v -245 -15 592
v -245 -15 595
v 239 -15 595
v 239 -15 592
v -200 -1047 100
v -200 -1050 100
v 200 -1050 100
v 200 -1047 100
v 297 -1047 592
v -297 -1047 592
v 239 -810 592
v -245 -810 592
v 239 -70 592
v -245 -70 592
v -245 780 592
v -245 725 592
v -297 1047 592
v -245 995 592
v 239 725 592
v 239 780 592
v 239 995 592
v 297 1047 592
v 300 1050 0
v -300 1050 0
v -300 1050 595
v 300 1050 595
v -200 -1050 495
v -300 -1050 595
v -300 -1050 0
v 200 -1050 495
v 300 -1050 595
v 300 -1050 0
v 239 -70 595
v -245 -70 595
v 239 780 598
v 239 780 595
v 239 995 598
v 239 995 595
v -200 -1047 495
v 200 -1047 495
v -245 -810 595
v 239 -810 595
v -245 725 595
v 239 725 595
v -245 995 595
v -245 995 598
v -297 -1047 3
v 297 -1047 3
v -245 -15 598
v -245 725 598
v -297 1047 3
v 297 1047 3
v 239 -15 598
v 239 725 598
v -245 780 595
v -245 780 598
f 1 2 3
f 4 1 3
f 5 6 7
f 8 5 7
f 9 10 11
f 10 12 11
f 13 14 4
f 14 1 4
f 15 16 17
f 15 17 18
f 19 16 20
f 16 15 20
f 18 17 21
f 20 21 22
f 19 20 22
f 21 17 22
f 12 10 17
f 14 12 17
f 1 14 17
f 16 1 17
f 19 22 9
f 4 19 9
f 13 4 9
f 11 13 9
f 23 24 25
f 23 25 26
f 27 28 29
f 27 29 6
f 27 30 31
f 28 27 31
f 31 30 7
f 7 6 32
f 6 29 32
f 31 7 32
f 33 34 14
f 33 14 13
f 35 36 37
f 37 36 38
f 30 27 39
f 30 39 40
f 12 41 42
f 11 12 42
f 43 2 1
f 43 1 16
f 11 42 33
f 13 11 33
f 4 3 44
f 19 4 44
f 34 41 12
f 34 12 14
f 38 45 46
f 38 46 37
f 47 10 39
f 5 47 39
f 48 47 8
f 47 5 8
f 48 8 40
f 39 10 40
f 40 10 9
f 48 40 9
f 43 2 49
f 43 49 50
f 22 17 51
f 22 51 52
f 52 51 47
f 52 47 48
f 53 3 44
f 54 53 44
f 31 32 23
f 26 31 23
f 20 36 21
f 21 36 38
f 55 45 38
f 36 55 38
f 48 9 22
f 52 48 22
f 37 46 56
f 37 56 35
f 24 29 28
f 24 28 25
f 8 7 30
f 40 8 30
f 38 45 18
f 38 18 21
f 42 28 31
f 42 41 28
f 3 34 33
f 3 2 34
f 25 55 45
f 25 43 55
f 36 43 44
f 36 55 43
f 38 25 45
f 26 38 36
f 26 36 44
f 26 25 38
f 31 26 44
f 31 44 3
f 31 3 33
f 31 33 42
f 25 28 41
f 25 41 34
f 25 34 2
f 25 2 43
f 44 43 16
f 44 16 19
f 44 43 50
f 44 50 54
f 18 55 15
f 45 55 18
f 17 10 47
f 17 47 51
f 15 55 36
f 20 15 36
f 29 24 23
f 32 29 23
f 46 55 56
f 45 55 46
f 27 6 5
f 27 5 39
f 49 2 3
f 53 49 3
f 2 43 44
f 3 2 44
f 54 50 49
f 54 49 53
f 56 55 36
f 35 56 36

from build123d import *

# Parameters (mm, degrees)
CROQUIS1_W                = 600
CROQUIS1_H                = 2100
SALIENTE_EXTRUIR1_DEPTH   = 595
CROQUIS2_W                = 594
CROQUIS2_H                = 2094
CORTAR_EXTRUIR1_DEPTH     = 592
CROQUIS3_W                = 594
CROQUIS3_H                = 237
SALIENTE_EXTRUIR2_DEPTH   = 3
CROQUIS4_W                = 400
CROQUIS4_H                = 395
CORTAR_EXTRUIR2_DEPTH     = 3
CROQUIS5_W                = 52
CROQUIS5_H                = 740
SALIENTE_EXTRUIR3_DEPTH   = 3
CROQUIS5_W_2              = 58
SALIENTE_EXTRUIR3_2_DEPTH = 3
CROQUIS6_W                = 484
CROQUIS6_H                = 740
SALIENTE_EXTRUIR4_DEPTH   = 3
CROQUIS7_W                = 594
CROQUIS7_H                = 55
SALIENTE_EXTRUIR5_DEPTH   = 3
CROQUIS8_W                = 52
CROQUIS8_H                = 740
CROQUIS8_W_2              = 58
SALIENTE_EXTRUIR6_DEPTH   = 3
CROQUIS9_W                = 484
CROQUIS9_H                = 740
SALIENTE_EXTRUIR7_DEPTH   = 3
CROQUIS10_W               = 594
CROQUIS10_H               = 322
CROQUIS10_W_2             = 484
CROQUIS10_H_2             = 215
SALIENTE_EXTRUIR8_DEPTH   = 3
CROQUIS11_W               = 484
CROQUIS11_H               = 215
SALIENTE_EXTRUIR9_DEPTH   = 3
CROQUIS12_W               = 484
CROQUIS12_H               = 740
CORTAR_EXTRUIR3_DEPTH     = 4


with BuildPart() as part:
    # Croquis1 → Saliente-Extruir1 (new body)
    with BuildSketch(Plane.XY):
        Rectangle(CROQUIS1_W, CROQUIS1_H)
    extrude(amount=SALIENTE_EXTRUIR1_DEPTH)

    # Croquis2 → Cortar-Extruir1 (cut)
    with BuildSketch(Plane.XY.offset(595)):
        Rectangle(CROQUIS2_W, CROQUIS2_H)
    extrude(amount=-CORTAR_EXTRUIR1_DEPTH, mode=Mode.SUBTRACT)

    # Croquis3 → Saliente-Extruir2 (add)
    with BuildSketch(Plane.XY.offset(595)):
        with Locations((0, -928.5)):
            Rectangle(CROQUIS3_W, CROQUIS3_H)
    extrude(amount=-SALIENTE_EXTRUIR2_DEPTH)

    # Croquis4 → Cortar-Extruir2 (cut)
    with BuildSketch(Plane.XZ.offset(1050)):
        with Locations((0, 297.5)):
            Rectangle(CROQUIS4_W, CROQUIS4_H)
    extrude(amount=-CORTAR_EXTRUIR2_DEPTH, mode=Mode.SUBTRACT)



with BuildPart() as body_2:
    # Croquis5 → Saliente-Extruir3 (new body)
    with BuildSketch(Plane.XY.offset(595)):
        with Locations((-271, -440)):
            Rectangle(CROQUIS5_W, CROQUIS5_H)
    extrude(amount=-SALIENTE_EXTRUIR3_DEPTH)


with BuildPart() as body_3:
    # Croquis5 → Saliente-Extruir3 2 (new body)
    with BuildSketch(Plane.XY.offset(595)):
        with Locations((268, -440)):
            Rectangle(CROQUIS5_W_2, CROQUIS5_H)
    extrude(amount=-SALIENTE_EXTRUIR3_2_DEPTH)


with BuildPart() as part_1:
    add(part.part)

    add(body_2.part)  # Saliente-Extruir4 merges body 2

    add(body_3.part)  # Saliente-Extruir4 merges body 3
    # Croquis6 → Saliente-Extruir4 (add)
    with BuildSketch(Plane.XY.offset(595)):
        with Locations((-3, -440)):
            Rectangle(CROQUIS6_W, CROQUIS6_H)
    extrude(amount=SALIENTE_EXTRUIR4_DEPTH)

    # Croquis7 → Saliente-Extruir5 (add)
    with BuildSketch(Plane.XY.offset(595)):
        with Locations((0, -42.5)):
            Rectangle(CROQUIS7_W, CROQUIS7_H)
    extrude(amount=-SALIENTE_EXTRUIR5_DEPTH)

    # Croquis8 → Saliente-Extruir6 (add)
    with BuildSketch(Plane.XY.offset(595)):
        with Locations((-271, 355)):
            Rectangle(CROQUIS8_W, CROQUIS8_H)
        with Locations((268, 355)):
            Rectangle(CROQUIS8_W_2, CROQUIS8_H)
    extrude(amount=-SALIENTE_EXTRUIR6_DEPTH)



with BuildPart() as body_2_2:
    # Croquis9 → Saliente-Extruir7 (new body)
    with BuildSketch(Plane.XY.offset(595)):
        with Locations((-3, 355)):
            Rectangle(CROQUIS9_W, CROQUIS9_H)
    extrude(amount=SALIENTE_EXTRUIR7_DEPTH)


with BuildPart() as part_2:
    add(part_1.part)

    add(body_2_2.part)  # Saliente-Extruir8 merges body 2 2
    # Croquis10 → Saliente-Extruir8 (add)
    with BuildSketch(Plane.XY.offset(595)):
        with Locations((0, 886)):
            Rectangle(CROQUIS10_W, CROQUIS10_H)
        with Locations((-3, 887.5)):
            Rectangle(CROQUIS10_W_2, CROQUIS10_H_2, mode=Mode.SUBTRACT)
    extrude(amount=-SALIENTE_EXTRUIR8_DEPTH)

    # Croquis12 → Cortar-Extruir3 (cut)
    with BuildSketch(Plane.XY.offset(598)):
        with Locations((-3, -440)):
            Rectangle(CROQUIS12_W, CROQUIS12_H)
    extrude(amount=-CORTAR_EXTRUIR3_DEPTH, mode=Mode.SUBTRACT)


with BuildPart() as body_2_3:
    # Croquis11 → Saliente-Extruir9 (new body)
    with BuildSketch(Plane.XY.offset(595)):
        with Locations((-3, 887.5)):
            Rectangle(CROQUIS11_W, CROQUIS11_H)
    extrude(amount=SALIENTE_EXTRUIR9_DEPTH)


solid = Compound([part_2.part, body_2_3.part])
